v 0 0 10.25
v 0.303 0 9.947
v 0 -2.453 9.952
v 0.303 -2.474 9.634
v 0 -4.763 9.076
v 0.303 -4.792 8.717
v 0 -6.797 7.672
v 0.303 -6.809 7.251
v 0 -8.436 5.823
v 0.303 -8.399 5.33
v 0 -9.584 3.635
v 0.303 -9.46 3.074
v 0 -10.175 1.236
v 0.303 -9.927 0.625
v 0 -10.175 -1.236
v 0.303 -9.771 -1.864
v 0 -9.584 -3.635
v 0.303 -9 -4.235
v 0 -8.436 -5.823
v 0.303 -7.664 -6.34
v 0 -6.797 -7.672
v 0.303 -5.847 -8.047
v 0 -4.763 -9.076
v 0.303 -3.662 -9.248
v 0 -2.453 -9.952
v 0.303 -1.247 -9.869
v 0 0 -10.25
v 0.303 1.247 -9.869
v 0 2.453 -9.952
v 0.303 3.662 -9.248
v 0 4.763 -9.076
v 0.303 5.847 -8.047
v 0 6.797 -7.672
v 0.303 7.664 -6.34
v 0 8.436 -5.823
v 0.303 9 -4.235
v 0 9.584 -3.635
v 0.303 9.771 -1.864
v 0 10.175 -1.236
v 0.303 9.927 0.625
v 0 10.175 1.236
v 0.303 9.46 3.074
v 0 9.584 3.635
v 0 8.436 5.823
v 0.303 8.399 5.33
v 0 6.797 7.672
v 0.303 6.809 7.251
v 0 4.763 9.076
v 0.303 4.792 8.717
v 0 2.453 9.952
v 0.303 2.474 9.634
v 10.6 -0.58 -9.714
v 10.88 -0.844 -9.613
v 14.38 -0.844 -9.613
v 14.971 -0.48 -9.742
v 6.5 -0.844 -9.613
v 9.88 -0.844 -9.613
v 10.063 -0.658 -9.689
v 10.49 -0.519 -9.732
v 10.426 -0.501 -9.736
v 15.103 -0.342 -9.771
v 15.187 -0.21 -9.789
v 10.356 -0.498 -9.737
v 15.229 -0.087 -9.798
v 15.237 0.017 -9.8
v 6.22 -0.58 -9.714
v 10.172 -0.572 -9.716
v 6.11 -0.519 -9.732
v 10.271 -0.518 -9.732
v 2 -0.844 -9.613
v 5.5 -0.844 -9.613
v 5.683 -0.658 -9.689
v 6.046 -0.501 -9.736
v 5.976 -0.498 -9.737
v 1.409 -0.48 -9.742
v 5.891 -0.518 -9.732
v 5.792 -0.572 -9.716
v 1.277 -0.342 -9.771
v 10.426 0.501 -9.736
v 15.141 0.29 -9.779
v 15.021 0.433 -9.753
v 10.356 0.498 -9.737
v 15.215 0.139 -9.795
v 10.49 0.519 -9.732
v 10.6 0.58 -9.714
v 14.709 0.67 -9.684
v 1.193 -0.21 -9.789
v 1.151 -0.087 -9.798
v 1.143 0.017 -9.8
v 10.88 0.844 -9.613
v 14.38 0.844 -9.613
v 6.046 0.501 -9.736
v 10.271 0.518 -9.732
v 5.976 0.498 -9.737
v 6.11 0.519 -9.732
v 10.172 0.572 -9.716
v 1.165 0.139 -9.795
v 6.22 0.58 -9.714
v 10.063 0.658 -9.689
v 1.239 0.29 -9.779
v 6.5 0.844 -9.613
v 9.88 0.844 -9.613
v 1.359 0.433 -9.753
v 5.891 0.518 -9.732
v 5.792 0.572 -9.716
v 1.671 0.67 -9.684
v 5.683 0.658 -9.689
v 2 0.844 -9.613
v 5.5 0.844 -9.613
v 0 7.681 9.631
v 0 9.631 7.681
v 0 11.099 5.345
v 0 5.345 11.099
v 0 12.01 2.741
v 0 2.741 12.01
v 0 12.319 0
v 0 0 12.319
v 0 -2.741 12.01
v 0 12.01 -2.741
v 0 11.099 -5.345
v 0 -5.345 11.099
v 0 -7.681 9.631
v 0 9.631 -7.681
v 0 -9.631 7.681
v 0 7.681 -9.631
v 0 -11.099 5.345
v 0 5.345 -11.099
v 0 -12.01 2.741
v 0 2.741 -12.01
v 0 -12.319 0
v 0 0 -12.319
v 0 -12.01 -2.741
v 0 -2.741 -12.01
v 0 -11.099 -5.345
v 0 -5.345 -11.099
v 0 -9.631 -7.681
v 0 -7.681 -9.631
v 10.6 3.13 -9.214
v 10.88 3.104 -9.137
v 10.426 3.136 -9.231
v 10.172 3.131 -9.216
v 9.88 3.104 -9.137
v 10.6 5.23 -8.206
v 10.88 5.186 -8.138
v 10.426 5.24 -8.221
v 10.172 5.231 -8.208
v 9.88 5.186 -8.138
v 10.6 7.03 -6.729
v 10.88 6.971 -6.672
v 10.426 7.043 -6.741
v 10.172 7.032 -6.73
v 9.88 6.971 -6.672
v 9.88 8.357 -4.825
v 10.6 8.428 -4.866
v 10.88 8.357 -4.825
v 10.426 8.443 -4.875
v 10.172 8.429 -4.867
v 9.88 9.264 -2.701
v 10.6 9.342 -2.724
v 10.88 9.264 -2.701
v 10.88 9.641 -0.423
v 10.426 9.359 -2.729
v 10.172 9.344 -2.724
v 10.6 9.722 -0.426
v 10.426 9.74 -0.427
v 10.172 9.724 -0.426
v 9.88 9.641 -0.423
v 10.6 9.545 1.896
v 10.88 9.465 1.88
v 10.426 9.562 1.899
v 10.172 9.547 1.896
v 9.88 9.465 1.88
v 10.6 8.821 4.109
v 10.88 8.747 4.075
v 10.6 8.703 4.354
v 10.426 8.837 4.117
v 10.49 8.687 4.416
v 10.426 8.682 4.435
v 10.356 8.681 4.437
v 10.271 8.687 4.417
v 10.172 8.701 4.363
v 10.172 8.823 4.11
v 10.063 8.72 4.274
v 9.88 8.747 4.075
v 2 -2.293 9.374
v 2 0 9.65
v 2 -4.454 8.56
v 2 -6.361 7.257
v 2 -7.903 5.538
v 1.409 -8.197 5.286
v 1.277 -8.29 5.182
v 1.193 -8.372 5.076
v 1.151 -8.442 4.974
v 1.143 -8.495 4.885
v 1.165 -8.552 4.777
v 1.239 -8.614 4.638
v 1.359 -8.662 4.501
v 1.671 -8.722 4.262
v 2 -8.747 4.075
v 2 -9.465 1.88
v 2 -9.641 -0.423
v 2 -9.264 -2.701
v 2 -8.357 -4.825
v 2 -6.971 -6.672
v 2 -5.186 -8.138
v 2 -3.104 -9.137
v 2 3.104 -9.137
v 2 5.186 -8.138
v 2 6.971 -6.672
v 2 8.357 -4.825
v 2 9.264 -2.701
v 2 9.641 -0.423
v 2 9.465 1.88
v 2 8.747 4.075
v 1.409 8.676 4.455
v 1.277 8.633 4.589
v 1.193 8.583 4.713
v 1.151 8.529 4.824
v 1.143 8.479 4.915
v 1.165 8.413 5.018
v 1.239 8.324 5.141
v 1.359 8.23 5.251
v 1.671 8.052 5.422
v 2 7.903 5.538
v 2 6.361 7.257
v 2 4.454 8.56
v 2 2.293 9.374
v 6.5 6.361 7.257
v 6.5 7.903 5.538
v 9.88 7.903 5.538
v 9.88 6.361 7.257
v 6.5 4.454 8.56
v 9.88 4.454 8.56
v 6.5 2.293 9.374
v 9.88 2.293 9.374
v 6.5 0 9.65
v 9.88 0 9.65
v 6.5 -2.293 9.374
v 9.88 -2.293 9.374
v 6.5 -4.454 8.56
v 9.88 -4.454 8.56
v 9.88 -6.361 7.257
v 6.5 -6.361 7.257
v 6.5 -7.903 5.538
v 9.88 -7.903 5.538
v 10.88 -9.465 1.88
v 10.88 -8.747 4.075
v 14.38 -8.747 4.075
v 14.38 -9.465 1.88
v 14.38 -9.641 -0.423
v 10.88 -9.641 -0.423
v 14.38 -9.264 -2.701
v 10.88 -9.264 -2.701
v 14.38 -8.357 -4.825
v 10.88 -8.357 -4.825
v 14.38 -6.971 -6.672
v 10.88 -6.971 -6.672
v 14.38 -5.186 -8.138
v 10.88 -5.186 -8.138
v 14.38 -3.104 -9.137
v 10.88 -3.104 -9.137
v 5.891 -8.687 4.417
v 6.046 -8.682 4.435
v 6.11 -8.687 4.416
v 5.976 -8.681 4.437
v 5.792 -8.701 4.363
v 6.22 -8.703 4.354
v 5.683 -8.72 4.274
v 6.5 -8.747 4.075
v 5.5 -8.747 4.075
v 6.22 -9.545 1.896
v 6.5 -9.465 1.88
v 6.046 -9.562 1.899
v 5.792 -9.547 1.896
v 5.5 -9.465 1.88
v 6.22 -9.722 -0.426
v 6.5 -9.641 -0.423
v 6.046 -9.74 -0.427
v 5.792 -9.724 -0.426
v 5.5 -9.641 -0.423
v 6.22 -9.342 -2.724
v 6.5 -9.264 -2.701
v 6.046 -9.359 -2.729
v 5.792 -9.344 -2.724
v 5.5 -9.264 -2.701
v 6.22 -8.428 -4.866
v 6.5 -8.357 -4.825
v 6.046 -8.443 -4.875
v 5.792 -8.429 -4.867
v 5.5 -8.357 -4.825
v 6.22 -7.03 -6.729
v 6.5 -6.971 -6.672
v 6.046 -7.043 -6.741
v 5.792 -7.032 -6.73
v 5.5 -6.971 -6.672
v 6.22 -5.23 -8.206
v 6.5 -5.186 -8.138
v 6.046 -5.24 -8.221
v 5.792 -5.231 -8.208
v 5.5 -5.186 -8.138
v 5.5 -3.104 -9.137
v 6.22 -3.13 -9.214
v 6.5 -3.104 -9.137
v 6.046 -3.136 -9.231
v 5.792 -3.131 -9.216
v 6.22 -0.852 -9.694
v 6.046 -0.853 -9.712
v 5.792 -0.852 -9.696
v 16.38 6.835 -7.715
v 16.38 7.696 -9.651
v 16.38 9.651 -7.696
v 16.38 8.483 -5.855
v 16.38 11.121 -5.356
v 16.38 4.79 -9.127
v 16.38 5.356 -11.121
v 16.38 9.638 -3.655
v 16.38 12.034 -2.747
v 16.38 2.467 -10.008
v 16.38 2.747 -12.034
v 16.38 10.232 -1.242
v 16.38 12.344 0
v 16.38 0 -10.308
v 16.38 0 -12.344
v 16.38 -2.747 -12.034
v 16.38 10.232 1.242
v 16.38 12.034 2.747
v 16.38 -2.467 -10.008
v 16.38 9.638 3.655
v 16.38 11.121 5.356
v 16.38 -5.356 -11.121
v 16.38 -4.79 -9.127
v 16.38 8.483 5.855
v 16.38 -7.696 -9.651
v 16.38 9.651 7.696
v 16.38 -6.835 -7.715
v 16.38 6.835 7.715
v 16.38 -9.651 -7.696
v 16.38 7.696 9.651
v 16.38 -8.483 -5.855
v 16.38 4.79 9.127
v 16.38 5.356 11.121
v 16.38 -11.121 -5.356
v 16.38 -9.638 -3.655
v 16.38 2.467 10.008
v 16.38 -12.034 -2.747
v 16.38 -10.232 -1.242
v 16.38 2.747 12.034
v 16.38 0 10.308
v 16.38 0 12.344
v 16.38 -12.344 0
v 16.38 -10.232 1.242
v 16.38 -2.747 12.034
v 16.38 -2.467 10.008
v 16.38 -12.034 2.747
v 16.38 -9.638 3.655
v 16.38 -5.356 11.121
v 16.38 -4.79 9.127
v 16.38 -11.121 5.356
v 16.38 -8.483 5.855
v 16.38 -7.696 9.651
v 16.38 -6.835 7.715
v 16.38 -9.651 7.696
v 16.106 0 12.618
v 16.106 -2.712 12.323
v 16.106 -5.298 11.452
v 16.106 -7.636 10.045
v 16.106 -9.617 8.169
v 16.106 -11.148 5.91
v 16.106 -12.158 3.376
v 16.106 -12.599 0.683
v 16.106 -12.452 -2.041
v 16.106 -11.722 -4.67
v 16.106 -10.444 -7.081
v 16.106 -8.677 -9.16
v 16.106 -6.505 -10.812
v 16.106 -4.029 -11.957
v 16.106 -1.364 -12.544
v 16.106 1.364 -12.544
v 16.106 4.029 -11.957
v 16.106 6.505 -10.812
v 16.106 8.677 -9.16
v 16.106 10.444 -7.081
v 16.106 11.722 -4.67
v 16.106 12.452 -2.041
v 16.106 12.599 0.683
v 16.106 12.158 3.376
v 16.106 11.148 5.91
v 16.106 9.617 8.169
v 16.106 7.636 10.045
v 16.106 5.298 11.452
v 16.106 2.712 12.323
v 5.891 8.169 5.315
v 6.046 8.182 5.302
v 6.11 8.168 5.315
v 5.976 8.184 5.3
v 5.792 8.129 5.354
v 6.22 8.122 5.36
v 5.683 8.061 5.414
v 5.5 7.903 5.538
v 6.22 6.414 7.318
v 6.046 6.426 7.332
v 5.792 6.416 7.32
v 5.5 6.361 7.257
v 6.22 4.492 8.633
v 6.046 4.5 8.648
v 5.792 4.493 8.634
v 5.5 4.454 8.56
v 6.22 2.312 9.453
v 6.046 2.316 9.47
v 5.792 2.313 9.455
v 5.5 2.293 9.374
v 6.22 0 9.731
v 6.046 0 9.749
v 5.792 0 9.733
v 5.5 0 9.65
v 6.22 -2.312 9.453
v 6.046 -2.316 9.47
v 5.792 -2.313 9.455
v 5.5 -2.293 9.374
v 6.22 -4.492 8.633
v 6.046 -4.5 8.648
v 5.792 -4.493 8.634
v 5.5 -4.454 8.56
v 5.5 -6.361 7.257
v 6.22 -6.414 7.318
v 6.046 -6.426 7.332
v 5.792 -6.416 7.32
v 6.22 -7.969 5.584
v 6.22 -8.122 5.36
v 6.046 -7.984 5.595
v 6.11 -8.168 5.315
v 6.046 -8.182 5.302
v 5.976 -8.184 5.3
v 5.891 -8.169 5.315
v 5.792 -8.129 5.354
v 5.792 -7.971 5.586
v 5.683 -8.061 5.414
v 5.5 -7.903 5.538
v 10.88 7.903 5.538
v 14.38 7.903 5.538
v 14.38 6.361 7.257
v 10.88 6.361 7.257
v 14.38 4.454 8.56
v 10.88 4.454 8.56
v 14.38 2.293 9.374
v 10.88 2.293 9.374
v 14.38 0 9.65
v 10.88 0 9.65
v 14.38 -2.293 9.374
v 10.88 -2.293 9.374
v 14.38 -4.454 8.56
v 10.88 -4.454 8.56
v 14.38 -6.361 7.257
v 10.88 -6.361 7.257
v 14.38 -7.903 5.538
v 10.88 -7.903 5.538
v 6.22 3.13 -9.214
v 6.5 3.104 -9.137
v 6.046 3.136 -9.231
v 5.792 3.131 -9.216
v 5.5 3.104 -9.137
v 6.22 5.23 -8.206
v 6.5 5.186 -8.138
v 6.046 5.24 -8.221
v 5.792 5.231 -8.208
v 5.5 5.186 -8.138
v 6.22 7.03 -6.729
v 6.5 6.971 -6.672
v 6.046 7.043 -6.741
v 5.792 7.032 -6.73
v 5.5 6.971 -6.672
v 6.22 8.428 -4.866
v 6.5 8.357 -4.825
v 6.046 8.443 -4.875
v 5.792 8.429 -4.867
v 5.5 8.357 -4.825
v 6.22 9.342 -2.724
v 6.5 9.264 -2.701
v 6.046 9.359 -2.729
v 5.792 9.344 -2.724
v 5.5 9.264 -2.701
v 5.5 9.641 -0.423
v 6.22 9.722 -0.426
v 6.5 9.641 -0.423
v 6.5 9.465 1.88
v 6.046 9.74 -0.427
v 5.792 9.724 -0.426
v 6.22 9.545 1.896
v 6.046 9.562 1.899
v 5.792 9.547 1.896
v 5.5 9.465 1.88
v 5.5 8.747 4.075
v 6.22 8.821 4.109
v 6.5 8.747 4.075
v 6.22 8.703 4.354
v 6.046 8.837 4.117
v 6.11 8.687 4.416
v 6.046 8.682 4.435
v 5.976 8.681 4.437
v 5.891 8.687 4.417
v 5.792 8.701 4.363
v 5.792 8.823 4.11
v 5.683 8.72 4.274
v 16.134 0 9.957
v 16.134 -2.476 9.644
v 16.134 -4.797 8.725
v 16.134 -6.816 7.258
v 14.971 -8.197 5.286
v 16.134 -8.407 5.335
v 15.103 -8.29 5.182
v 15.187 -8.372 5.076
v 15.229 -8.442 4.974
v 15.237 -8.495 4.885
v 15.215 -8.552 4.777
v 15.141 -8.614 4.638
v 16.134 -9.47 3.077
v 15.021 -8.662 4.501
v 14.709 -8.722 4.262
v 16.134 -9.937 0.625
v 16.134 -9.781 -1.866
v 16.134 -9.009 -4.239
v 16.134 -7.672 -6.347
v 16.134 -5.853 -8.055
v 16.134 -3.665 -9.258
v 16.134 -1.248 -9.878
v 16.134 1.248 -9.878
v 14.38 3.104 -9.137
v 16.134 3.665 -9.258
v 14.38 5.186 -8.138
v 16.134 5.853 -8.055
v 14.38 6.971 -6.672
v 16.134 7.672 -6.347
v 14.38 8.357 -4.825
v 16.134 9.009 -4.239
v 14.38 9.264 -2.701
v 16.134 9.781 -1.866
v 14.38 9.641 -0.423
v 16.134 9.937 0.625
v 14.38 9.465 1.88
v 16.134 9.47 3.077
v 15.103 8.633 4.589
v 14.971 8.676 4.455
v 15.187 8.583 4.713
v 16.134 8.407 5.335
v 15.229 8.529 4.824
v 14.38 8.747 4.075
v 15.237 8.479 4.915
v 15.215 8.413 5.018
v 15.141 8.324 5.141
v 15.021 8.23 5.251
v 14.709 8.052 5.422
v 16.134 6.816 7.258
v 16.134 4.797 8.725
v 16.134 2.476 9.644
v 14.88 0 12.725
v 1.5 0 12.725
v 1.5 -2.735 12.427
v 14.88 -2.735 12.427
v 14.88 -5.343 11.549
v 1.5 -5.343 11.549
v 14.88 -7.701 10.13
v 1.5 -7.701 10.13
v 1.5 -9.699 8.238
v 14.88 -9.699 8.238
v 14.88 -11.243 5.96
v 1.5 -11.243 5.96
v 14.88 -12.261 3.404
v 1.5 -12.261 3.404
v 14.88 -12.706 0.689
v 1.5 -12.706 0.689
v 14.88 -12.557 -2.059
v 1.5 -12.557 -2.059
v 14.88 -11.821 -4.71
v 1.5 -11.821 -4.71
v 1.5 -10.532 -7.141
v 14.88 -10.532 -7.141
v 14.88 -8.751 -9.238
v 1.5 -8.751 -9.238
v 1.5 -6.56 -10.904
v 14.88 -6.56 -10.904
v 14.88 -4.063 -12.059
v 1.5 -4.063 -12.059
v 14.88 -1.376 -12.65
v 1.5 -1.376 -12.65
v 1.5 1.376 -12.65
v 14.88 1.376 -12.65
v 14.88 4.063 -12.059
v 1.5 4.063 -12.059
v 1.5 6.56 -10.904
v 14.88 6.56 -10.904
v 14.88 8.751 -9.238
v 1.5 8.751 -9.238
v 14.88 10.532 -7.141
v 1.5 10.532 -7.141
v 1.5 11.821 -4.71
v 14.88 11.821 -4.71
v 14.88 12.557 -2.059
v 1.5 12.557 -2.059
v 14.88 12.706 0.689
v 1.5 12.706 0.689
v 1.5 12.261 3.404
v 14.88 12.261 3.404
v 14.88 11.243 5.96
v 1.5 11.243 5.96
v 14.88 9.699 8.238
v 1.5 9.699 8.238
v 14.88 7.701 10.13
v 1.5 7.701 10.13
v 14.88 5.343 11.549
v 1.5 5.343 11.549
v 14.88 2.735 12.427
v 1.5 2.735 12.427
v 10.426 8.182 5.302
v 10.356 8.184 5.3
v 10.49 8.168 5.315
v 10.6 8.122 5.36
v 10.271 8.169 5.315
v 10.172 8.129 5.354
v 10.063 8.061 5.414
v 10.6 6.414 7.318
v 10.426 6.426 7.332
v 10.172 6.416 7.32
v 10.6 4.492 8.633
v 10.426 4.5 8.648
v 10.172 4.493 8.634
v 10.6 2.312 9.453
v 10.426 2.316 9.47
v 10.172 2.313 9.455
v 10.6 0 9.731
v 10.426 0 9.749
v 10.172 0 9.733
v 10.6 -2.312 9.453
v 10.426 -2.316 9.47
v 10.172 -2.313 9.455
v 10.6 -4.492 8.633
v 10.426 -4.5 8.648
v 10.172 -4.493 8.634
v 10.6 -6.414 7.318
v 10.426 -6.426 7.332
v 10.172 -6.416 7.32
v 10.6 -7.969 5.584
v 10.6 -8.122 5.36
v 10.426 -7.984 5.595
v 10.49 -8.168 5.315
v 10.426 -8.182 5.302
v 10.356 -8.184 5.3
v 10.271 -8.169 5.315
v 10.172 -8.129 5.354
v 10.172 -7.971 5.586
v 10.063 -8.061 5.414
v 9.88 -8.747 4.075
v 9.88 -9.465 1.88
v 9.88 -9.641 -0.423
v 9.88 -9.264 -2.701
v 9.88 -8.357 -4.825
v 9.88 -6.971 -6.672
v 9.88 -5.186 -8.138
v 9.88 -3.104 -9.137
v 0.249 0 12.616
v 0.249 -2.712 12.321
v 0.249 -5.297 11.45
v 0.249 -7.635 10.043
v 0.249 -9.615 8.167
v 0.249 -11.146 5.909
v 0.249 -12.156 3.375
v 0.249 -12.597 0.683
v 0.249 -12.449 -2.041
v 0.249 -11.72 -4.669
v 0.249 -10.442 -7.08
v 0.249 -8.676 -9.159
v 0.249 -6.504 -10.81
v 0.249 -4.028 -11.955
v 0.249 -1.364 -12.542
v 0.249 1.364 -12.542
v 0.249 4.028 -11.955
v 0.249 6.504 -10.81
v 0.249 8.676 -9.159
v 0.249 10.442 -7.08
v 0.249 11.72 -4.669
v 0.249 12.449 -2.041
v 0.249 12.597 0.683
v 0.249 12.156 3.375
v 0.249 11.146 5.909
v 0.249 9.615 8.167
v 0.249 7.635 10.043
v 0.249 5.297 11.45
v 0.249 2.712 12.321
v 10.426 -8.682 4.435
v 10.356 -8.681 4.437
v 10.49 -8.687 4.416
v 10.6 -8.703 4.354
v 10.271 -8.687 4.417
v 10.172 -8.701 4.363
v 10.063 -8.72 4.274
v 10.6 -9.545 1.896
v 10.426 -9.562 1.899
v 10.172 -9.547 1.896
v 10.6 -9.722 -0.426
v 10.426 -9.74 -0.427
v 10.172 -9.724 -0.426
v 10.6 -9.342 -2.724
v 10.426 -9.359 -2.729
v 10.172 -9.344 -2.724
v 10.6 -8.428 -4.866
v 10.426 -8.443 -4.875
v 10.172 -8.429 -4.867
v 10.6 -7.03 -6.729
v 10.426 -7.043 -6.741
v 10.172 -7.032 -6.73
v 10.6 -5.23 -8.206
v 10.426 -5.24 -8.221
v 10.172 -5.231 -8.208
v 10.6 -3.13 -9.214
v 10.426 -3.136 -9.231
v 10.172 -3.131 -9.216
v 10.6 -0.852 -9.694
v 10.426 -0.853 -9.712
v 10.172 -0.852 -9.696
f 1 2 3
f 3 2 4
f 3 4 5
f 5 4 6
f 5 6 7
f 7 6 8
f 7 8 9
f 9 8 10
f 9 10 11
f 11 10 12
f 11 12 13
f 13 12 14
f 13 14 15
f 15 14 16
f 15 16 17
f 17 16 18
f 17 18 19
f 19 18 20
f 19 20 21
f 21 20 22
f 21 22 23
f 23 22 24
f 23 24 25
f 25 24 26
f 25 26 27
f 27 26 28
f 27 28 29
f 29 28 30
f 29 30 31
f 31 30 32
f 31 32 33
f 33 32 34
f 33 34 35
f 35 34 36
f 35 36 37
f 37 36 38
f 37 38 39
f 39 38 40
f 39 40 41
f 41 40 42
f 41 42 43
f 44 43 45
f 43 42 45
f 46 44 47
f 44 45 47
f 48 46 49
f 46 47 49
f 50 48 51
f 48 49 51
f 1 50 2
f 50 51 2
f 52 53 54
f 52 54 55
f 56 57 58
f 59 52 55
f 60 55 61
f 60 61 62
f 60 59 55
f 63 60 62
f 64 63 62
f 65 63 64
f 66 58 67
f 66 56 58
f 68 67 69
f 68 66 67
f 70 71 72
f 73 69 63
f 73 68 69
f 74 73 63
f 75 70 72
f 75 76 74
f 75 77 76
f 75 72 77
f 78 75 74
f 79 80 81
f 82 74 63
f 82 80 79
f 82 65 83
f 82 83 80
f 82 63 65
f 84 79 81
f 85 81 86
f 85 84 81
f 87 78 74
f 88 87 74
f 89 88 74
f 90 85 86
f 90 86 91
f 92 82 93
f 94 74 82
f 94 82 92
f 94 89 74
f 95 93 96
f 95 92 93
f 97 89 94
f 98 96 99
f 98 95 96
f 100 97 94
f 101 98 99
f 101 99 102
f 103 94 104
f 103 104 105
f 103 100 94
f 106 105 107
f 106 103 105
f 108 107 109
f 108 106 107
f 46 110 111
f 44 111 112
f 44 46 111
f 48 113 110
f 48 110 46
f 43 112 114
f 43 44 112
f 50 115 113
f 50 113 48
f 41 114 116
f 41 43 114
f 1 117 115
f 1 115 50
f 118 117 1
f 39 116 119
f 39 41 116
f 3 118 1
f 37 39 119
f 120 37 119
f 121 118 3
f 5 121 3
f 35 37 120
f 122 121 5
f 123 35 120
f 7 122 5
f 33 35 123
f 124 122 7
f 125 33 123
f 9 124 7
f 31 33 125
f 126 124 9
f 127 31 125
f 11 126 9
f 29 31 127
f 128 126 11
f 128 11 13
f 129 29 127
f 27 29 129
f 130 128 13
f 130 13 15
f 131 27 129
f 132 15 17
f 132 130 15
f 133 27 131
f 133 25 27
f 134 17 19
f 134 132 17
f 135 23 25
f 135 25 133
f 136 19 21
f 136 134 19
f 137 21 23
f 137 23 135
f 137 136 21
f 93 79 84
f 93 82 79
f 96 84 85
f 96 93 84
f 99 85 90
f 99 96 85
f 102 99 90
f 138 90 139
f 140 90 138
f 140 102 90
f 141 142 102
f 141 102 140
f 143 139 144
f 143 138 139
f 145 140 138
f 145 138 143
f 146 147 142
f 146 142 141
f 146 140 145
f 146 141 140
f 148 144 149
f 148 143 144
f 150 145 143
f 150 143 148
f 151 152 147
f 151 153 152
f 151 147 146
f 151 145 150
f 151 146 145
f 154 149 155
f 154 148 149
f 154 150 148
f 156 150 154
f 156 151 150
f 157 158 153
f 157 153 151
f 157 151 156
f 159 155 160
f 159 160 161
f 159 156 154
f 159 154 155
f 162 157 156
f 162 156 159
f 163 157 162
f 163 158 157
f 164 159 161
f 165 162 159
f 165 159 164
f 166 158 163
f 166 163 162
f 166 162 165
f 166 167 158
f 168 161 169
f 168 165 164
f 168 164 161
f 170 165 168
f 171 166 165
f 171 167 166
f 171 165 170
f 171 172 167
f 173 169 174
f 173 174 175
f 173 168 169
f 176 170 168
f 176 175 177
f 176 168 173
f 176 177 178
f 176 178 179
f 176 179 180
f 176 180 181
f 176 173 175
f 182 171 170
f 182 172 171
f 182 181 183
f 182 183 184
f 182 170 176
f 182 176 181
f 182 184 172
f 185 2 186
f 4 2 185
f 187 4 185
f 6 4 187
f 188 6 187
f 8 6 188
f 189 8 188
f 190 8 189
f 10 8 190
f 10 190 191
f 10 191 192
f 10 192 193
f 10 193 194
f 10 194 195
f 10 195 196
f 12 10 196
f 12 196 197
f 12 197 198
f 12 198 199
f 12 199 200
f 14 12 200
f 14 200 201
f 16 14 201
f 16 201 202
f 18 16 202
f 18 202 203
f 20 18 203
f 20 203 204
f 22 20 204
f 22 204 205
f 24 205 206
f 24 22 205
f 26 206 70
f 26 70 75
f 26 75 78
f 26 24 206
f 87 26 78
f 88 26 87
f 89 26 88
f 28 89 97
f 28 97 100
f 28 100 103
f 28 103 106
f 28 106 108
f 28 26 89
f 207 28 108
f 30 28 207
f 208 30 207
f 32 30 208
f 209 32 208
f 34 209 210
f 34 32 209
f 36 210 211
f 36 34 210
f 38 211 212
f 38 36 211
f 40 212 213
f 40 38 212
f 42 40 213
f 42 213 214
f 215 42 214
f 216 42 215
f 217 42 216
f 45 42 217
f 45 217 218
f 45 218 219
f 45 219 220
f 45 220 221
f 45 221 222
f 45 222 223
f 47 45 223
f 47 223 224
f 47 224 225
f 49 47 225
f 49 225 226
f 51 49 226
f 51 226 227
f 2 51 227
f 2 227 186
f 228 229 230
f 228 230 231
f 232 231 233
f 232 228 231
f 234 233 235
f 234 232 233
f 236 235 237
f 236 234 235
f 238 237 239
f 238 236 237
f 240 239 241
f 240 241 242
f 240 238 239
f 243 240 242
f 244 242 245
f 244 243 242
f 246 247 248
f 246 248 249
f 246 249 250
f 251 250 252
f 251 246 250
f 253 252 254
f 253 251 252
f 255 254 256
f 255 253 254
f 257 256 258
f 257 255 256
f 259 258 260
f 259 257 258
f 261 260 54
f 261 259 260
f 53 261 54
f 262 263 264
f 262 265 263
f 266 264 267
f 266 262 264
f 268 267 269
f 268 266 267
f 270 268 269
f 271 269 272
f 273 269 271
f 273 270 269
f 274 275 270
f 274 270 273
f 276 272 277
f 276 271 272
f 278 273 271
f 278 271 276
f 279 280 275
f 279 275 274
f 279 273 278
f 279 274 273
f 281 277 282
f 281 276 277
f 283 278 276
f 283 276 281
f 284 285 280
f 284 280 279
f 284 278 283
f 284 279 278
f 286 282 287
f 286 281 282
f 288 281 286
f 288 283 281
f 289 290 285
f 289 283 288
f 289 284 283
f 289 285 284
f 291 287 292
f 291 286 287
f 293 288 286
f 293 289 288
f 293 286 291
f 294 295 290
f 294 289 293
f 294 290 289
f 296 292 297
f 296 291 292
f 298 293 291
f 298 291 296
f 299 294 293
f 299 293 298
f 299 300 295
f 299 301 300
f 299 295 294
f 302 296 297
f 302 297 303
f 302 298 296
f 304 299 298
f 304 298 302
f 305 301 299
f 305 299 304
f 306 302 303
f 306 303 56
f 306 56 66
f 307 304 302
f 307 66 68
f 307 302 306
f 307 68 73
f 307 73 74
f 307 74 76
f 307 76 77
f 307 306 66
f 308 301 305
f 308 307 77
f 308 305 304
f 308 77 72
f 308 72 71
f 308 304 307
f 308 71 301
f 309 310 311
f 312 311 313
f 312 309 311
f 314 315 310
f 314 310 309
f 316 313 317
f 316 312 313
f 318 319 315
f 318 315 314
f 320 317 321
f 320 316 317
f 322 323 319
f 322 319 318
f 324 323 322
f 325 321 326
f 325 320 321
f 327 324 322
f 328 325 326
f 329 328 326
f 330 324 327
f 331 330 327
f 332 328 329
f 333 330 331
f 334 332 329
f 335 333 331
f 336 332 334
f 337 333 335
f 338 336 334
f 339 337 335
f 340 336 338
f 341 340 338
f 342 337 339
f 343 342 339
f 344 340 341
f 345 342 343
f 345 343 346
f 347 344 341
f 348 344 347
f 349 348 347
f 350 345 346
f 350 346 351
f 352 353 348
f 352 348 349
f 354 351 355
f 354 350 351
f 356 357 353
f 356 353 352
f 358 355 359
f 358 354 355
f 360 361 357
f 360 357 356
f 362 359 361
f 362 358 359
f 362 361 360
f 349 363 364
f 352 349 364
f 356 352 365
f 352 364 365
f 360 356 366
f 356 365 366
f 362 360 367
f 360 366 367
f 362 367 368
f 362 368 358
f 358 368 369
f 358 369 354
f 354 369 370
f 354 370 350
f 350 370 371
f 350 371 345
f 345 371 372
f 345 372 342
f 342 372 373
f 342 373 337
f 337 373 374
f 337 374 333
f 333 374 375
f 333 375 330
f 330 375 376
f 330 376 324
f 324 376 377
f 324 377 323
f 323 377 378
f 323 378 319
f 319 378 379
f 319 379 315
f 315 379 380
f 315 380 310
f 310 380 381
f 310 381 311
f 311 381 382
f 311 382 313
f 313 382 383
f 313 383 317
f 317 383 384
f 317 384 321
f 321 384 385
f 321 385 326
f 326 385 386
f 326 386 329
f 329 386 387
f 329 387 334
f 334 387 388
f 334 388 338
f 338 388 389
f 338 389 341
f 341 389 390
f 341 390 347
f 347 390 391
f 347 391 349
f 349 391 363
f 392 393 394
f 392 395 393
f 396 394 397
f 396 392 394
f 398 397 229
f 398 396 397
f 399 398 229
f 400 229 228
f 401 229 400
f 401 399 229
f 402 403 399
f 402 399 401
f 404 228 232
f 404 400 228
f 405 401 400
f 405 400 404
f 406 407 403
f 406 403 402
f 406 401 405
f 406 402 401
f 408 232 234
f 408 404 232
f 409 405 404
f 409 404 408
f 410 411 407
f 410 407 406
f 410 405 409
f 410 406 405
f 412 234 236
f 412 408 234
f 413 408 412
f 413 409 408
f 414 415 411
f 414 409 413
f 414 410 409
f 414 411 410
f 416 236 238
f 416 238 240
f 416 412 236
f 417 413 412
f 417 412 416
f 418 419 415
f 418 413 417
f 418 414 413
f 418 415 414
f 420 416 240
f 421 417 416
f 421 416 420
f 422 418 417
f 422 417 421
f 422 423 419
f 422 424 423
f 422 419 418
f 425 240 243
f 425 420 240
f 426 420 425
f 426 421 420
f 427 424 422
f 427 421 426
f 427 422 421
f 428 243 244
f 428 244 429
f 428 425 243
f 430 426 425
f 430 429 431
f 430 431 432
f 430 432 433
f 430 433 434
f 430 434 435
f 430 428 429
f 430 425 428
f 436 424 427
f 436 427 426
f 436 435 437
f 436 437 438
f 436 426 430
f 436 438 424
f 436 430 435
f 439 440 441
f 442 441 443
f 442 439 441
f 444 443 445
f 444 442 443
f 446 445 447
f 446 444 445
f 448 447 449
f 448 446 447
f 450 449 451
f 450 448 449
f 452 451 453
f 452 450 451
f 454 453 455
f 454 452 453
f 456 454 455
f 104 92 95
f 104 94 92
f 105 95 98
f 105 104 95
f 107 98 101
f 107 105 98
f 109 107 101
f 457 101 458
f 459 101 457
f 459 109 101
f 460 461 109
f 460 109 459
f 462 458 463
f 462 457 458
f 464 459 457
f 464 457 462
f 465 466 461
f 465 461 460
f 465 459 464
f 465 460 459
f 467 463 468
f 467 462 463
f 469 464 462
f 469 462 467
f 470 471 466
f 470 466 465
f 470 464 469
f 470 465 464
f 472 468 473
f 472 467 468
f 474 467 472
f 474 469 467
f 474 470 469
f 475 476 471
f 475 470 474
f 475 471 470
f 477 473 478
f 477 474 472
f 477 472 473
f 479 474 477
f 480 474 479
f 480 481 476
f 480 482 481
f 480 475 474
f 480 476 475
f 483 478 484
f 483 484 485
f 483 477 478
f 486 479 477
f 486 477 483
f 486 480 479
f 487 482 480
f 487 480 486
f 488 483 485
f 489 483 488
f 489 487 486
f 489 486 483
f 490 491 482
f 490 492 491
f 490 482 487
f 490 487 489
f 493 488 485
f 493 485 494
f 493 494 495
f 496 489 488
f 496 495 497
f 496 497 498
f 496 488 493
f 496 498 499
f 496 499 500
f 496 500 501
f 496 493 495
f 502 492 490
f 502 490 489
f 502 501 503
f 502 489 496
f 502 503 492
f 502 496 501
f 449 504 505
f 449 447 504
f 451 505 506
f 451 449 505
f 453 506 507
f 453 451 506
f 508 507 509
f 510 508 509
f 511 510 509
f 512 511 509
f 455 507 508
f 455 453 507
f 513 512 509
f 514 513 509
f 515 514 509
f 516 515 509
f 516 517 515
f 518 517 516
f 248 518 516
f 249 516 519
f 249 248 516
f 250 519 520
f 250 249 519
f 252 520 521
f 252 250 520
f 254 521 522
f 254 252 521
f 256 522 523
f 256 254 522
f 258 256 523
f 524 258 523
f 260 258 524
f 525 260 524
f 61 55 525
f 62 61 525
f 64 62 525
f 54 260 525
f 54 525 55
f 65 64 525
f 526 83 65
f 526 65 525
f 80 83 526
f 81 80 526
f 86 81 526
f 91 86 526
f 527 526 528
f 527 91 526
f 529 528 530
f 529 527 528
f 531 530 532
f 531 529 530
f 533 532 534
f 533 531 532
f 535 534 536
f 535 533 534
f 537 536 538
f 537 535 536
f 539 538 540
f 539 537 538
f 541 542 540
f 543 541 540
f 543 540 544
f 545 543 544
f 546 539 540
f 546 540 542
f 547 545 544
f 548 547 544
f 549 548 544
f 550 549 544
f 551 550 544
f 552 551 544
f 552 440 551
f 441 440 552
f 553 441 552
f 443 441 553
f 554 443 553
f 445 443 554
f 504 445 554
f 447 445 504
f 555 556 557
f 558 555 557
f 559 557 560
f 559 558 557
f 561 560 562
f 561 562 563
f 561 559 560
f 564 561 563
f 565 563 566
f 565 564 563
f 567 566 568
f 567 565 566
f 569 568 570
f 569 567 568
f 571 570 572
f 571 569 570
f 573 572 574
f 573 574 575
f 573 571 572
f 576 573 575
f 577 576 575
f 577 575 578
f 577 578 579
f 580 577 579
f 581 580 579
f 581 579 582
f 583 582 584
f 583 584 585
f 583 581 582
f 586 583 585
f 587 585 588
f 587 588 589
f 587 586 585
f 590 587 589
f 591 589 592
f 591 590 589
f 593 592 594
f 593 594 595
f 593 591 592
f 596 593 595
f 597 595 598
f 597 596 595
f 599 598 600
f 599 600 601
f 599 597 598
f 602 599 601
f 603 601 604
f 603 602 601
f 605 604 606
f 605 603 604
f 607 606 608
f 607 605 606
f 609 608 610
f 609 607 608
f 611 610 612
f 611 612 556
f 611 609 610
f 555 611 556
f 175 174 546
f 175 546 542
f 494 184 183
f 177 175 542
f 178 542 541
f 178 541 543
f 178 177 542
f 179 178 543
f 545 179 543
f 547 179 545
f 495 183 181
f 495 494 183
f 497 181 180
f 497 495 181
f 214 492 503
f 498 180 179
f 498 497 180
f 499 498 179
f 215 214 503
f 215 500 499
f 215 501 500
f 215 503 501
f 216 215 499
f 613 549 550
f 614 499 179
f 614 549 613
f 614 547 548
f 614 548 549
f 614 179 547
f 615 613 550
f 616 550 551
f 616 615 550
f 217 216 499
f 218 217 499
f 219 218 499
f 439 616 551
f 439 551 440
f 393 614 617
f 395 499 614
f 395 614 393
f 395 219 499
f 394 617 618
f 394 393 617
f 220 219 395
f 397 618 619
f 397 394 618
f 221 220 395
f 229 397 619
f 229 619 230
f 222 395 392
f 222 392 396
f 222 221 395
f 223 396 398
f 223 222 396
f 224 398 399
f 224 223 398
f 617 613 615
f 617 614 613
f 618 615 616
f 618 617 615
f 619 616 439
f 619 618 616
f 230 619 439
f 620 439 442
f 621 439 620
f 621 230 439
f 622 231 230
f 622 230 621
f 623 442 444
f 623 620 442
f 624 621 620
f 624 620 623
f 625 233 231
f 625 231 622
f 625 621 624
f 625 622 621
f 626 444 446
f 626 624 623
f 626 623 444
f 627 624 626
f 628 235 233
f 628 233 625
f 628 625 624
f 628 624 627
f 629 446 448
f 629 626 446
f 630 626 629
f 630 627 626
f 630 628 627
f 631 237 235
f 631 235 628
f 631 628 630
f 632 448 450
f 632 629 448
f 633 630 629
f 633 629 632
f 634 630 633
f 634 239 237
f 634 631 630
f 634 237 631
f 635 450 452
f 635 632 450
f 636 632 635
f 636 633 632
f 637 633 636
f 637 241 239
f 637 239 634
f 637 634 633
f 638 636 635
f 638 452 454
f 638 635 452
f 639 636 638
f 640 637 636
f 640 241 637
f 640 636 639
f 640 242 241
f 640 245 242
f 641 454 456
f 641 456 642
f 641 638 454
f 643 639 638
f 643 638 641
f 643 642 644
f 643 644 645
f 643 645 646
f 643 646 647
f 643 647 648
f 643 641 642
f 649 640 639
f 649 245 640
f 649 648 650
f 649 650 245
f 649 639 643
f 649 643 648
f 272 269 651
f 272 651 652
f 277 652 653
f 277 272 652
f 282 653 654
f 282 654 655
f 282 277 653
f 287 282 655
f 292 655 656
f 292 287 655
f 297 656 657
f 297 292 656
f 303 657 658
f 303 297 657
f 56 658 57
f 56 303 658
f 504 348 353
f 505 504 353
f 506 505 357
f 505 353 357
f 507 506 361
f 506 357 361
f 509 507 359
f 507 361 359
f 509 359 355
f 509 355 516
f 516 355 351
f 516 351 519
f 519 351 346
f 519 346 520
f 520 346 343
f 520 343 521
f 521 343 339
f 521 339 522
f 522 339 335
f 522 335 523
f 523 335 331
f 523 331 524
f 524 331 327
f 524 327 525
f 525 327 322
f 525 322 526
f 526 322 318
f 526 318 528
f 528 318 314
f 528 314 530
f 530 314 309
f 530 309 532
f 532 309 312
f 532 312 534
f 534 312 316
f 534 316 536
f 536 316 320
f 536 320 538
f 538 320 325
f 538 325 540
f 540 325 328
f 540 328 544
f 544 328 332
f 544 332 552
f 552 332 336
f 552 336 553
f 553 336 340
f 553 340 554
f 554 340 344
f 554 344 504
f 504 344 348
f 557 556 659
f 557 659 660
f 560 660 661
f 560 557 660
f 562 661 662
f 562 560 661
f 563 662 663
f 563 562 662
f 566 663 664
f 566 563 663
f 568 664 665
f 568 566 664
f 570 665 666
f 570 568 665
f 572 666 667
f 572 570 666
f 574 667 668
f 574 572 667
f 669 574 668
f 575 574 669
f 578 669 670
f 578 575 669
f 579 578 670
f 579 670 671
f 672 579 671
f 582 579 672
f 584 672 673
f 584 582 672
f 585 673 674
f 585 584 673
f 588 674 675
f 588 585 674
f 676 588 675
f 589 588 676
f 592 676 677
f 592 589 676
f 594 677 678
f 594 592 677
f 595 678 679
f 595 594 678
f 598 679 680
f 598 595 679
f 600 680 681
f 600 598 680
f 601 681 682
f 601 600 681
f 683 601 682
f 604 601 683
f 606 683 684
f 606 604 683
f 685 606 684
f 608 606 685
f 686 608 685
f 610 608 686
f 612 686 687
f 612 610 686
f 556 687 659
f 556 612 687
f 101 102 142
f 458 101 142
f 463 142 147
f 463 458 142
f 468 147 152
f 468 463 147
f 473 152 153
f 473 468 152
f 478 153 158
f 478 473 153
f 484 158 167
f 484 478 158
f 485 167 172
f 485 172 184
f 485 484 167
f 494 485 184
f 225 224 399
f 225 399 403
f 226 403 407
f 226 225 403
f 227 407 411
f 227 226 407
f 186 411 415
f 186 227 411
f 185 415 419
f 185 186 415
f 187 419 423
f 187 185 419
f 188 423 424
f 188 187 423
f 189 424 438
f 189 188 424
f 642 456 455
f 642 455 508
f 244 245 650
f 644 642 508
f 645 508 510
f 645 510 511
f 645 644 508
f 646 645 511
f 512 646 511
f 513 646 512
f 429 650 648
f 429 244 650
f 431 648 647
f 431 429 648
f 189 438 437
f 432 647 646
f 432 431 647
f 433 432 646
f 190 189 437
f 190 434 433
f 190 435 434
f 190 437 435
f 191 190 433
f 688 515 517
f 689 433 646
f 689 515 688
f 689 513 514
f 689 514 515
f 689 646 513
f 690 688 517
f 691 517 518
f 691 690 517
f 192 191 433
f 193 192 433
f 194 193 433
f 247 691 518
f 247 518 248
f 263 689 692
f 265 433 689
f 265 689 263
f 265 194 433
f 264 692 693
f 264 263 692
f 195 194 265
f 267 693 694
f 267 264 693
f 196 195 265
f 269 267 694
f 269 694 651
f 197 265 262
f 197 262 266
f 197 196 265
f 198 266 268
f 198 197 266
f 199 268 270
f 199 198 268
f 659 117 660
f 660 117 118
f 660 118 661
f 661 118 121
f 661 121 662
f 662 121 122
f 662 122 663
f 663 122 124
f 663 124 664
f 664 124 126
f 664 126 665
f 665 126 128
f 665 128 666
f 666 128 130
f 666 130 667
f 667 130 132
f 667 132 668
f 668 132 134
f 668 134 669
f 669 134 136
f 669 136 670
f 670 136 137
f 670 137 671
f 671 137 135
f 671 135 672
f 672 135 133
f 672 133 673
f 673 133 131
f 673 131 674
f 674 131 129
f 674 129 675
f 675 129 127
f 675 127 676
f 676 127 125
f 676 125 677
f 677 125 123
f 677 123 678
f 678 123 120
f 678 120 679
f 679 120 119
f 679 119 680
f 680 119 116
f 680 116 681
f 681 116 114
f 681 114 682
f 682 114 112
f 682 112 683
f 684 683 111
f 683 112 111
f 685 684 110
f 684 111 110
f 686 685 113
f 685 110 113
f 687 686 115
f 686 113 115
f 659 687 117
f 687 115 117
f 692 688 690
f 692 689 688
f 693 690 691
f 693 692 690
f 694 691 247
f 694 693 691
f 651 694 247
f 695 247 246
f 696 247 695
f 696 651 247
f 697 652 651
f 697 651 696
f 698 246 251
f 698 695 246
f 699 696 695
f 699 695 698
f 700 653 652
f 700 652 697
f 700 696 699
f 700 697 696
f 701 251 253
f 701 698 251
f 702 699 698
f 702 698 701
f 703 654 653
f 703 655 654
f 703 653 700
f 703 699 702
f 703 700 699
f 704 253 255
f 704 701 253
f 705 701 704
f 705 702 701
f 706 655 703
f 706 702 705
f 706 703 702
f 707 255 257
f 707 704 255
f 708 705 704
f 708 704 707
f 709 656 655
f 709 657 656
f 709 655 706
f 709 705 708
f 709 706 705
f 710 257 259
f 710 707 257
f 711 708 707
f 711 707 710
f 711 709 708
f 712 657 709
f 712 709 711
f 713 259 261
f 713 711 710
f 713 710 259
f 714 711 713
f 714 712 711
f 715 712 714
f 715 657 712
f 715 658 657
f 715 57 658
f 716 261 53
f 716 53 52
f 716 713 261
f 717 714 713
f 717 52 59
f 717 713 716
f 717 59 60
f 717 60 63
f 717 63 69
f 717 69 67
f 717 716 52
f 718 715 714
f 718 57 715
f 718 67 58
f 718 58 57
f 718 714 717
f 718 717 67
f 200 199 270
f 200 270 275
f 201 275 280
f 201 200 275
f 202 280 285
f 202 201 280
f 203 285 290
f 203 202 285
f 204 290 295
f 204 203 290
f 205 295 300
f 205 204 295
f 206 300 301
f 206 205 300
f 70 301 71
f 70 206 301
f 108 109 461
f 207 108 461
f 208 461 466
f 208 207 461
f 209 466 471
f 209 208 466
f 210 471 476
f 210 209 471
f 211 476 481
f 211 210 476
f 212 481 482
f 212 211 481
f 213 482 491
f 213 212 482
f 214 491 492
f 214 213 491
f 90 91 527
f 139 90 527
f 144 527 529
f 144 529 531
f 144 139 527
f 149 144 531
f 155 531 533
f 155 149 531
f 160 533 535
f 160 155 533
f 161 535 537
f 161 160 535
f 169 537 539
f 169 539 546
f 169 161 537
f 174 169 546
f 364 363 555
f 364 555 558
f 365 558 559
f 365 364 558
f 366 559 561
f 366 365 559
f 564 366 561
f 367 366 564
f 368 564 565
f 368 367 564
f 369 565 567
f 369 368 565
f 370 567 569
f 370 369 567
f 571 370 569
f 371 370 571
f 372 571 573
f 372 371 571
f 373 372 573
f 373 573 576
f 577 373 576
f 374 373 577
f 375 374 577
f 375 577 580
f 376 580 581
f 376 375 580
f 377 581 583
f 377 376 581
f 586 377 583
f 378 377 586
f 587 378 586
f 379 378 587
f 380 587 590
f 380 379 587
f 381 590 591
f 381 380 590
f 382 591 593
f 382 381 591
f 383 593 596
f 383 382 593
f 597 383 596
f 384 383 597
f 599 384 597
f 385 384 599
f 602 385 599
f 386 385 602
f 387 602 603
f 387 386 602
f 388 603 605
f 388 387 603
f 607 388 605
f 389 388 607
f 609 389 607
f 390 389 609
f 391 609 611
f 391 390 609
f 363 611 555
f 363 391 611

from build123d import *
from OCP.BRepFilletAPI import BRepFilletAPI_MakeChamfer

# Parameters (mm, degrees)
ID_CHAMFER_SIZE   = 0.25
ID_CHAMFER_SIZE2  = 0.307635462
OD_CHAMFER_SIZE   = 0.25
OD_CHAMFER_SIZE2  = 0.275015717
BORE_SLOT_DEPTH   = 25.334248499
CIRPATTERN1_COUNT = 3


with BuildPart() as part:
    # Sketch1 → Revolve1 (revolve)
    with BuildSketch(Plane.XY, mode=Mode.PRIVATE) as revolve1_sk:
        with BuildLine():
            Line((0, 10), (0, 12.593767005))
            Line((0, 12.593767005), (1.5, 12.725))
            Line((1.5, 12.725), (14.88, 12.725))
            Line((14.88, 12.725), (16.38, 12.593767005))
            Line((16.38, 12.593767005), (16.38, 10))
            Line((16.38, 10), (14.38, 9.65))
            Line((14.38, 9.65), (10.88, 9.65))
            ThreePointArc((10.88, 9.65), (10.38, 9.75), (9.88, 9.65))
            Line((9.88, 9.65), (6.5, 9.65))
            ThreePointArc((6.5, 9.65), (6, 9.75), (5.5, 9.65))
            Line((5.5, 9.65), (2, 9.65))
            Line((2, 9.65), (0, 10))
        make_face()
    revolve(revolve1_sk.sketch.rotate(Axis((-2.430533636, 0, 0), (1, 0, 0)), 90), axis=Axis((-2.430533636, 0, 0), (1, 0, 0)))

    # ID Chamfer: one chamfer whose edges measure the first distance from different faces: ONE call of the kernel's chamfer builder (chamfer() names one face for all edges)
    id_chamfer_edges_1 = [part.edges().sort_by_distance(p)[0] for p in [
        (16.38, 0, -10),
    ]]
    id_chamfer_side_1 = [part.faces().sort_by_distance(p)[0] for p in [
        (15.38, 0, -9.825),
    ]]
    id_chamfer_edges_2 = [part.edges().sort_by_distance(p)[0] for p in [
        (0, 0, -10),
    ]]
    id_chamfer_side_2 = [part.faces().sort_by_distance(p)[0] for p in [
        (0, 0, -10.356205522),
    ]]
    id_chamfer = BRepFilletAPI_MakeChamfer(part.part.solid().wrapped)
    for e in id_chamfer_edges_1:
        id_chamfer.Add(ID_CHAMFER_SIZE, ID_CHAMFER_SIZE2, e.wrapped, id_chamfer_side_1[0].wrapped)  # the first distance lies on this face
    for e in id_chamfer_edges_2:
        id_chamfer.Add(ID_CHAMFER_SIZE, ID_CHAMFER_SIZE2, e.wrapped, id_chamfer_side_2[0].wrapped)  # the first distance lies on this face
    add(Compound.cast(id_chamfer.Shape()), mode=Mode.REPLACE)

    # OD Chamfer: one chamfer whose edges measure the first distance from different faces: ONE call of the kernel's chamfer builder (chamfer() names one face for all edges)
    od_chamfer_edges_1 = [part.edges().sort_by_distance(p)[0] for p in [
        (16.38, 0, -12.593767005),
    ]]
    od_chamfer_side_1 = [part.faces().sort_by_distance(p)[0] for p in [
        (16.38, 0, -10.663840984),
    ]]
    od_chamfer_edges_2 = [part.edges().sort_by_distance(p)[0] for p in [
        (0, 0, -12.593767005),
    ]]
    od_chamfer_side_2 = [part.faces().sort_by_distance(p)[0] for p in [
        (0.75, 0, -12.659383502),
    ]]
    od_chamfer = BRepFilletAPI_MakeChamfer(part.part.solid().wrapped)
    for e in od_chamfer_edges_1:
        od_chamfer.Add(OD_CHAMFER_SIZE, OD_CHAMFER_SIZE2, e.wrapped, od_chamfer_side_1[0].wrapped)  # the first distance lies on this face
    for e in od_chamfer_edges_2:
        od_chamfer.Add(OD_CHAMFER_SIZE, OD_CHAMFER_SIZE2, e.wrapped, od_chamfer_side_2[0].wrapped)  # the first distance lies on this face
    add(Compound.cast(od_chamfer.Shape()), mode=Mode.REPLACE)

    # Sketch2 → Bore Slot (cut, through all)
    with BuildSketch(Plane(origin=(0, 0, 0), x_dir=(0, 0, -1), z_dir=(1, 0, 0))):
        with BuildLine():
            ThreePointArc((-4.075172705, 8.747312011), (-4.9, 8.487048957), (-5.537808064, 7.902859093))
            ThreePointArc((-5.537808064, 7.902859093), (-4.825, 8.357145147), (-4.075172705, 8.747312011))
        make_face()
    bore_slot = extrude(amount=BORE_SLOT_DEPTH, mode=Mode.SUBTRACT)

    # CirPattern1: Bore Slot ×3 about axis
    cirpattern1_axis = Axis((0, 0, 0), (1, 0, 0))
    for i in range(1, CIRPATTERN1_COUNT):
        add(bore_slot.rotate(cirpattern1_axis, i * 360 / CIRPATTERN1_COUNT), mode=Mode.SUBTRACT)


solid = part.part
